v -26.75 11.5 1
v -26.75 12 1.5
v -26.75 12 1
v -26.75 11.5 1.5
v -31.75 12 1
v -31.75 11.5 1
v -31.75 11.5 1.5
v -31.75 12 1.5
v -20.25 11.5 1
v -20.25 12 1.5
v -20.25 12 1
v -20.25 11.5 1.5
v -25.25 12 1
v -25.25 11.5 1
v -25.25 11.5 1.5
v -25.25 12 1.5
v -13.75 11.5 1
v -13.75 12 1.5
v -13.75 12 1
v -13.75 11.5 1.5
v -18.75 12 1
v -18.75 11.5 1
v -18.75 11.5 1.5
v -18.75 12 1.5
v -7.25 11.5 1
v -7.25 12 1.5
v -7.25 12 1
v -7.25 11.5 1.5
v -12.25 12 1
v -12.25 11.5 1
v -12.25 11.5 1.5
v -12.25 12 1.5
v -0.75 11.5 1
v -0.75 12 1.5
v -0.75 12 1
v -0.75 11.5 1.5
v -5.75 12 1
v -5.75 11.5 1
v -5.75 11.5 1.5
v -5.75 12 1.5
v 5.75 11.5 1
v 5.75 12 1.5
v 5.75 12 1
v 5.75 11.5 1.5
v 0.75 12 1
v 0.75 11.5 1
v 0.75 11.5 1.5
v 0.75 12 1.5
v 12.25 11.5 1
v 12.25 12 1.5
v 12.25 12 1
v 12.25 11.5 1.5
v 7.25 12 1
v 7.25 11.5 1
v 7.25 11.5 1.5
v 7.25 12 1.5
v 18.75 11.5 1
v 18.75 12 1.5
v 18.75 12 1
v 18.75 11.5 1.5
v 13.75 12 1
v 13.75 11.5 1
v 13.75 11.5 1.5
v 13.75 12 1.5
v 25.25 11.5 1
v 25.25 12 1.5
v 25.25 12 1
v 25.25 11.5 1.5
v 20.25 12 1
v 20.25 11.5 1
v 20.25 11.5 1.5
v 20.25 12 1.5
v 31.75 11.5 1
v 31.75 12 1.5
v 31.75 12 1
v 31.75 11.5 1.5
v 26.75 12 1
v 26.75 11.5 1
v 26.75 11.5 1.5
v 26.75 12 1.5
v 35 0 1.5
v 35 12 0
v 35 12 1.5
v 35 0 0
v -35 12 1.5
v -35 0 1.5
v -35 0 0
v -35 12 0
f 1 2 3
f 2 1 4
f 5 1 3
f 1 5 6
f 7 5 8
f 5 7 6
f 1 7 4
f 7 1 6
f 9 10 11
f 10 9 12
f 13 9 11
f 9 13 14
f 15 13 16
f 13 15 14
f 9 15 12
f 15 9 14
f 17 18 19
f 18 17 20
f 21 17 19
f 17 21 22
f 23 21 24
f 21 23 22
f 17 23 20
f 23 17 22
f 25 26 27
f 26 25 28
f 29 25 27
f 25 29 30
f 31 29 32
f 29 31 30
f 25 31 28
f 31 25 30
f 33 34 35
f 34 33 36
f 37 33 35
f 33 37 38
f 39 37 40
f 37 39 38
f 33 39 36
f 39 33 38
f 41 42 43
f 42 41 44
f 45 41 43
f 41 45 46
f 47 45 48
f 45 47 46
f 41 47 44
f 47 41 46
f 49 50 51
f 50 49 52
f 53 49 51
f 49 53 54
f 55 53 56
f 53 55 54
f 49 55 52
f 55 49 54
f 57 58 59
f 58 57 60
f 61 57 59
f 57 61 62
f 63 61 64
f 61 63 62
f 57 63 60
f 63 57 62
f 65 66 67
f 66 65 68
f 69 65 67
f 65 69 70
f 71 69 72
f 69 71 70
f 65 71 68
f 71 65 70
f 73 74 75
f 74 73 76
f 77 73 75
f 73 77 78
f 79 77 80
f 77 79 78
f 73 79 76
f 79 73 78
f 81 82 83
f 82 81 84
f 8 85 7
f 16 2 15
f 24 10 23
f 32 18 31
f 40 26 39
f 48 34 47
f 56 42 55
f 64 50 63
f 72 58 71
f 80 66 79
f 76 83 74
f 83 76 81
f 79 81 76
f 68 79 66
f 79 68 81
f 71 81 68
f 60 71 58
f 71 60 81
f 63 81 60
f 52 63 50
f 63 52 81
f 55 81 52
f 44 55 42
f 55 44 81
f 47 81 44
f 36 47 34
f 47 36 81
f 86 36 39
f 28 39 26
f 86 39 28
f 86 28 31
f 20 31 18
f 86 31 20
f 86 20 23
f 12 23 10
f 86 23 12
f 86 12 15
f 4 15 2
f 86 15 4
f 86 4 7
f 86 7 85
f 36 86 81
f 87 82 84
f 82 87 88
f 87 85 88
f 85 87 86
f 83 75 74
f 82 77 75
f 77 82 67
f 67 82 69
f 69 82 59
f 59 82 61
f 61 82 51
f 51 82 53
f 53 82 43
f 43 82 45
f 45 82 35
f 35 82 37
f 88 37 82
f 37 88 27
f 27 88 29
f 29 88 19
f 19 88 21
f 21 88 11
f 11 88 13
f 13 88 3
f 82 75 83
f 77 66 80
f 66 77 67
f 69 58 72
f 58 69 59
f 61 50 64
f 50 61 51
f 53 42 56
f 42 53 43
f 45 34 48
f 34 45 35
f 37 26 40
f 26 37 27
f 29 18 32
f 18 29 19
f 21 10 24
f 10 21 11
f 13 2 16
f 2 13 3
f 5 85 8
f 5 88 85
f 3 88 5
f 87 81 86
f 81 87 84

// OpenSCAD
// 10-well comb for agarose gel casting, printed lying flat
// Units: mm

// ---- Spine ----
spine_len   = 70;    // spine length along X
spine_wid   = 12;    // spine width along Y
spine_thk   = 1.5;   // spine thickness along Z

// ---- Teeth ----
tooth_count = 10;    // number of wells/teeth
tooth_w     = 5.0;   // tooth width along X
tooth_l     = 12;    // tooth length along Y (hangs in -Y)
tooth_gap   = 1.5;   // gap between neighbouring teeth along X

// ---- Misc ----
eps         = 0.5;   // cutter overshoot past faces

$fn = 64;

// Derived
pitch   = tooth_w + tooth_gap;          // centre-to-centre tooth spacing
x_start = -(tooth_count - 1) * pitch / 2; // first tooth centre, row centred

difference() {
    // Spine (back bar)
    translate([-spine_len / 2, 0, 0])
        cube([spine_len, spine_wid, spine_thk]);

    // Teeth cut out from the top edge (at y = spine_wid)
    for (i = [0 : tooth_count - 1])
        translate([x_start + i * pitch - tooth_w / 2,
                   spine_wid - eps,
                   spine_thk - eps])
            cube([tooth_w, tooth_l + eps, tooth_l + eps]);
}
